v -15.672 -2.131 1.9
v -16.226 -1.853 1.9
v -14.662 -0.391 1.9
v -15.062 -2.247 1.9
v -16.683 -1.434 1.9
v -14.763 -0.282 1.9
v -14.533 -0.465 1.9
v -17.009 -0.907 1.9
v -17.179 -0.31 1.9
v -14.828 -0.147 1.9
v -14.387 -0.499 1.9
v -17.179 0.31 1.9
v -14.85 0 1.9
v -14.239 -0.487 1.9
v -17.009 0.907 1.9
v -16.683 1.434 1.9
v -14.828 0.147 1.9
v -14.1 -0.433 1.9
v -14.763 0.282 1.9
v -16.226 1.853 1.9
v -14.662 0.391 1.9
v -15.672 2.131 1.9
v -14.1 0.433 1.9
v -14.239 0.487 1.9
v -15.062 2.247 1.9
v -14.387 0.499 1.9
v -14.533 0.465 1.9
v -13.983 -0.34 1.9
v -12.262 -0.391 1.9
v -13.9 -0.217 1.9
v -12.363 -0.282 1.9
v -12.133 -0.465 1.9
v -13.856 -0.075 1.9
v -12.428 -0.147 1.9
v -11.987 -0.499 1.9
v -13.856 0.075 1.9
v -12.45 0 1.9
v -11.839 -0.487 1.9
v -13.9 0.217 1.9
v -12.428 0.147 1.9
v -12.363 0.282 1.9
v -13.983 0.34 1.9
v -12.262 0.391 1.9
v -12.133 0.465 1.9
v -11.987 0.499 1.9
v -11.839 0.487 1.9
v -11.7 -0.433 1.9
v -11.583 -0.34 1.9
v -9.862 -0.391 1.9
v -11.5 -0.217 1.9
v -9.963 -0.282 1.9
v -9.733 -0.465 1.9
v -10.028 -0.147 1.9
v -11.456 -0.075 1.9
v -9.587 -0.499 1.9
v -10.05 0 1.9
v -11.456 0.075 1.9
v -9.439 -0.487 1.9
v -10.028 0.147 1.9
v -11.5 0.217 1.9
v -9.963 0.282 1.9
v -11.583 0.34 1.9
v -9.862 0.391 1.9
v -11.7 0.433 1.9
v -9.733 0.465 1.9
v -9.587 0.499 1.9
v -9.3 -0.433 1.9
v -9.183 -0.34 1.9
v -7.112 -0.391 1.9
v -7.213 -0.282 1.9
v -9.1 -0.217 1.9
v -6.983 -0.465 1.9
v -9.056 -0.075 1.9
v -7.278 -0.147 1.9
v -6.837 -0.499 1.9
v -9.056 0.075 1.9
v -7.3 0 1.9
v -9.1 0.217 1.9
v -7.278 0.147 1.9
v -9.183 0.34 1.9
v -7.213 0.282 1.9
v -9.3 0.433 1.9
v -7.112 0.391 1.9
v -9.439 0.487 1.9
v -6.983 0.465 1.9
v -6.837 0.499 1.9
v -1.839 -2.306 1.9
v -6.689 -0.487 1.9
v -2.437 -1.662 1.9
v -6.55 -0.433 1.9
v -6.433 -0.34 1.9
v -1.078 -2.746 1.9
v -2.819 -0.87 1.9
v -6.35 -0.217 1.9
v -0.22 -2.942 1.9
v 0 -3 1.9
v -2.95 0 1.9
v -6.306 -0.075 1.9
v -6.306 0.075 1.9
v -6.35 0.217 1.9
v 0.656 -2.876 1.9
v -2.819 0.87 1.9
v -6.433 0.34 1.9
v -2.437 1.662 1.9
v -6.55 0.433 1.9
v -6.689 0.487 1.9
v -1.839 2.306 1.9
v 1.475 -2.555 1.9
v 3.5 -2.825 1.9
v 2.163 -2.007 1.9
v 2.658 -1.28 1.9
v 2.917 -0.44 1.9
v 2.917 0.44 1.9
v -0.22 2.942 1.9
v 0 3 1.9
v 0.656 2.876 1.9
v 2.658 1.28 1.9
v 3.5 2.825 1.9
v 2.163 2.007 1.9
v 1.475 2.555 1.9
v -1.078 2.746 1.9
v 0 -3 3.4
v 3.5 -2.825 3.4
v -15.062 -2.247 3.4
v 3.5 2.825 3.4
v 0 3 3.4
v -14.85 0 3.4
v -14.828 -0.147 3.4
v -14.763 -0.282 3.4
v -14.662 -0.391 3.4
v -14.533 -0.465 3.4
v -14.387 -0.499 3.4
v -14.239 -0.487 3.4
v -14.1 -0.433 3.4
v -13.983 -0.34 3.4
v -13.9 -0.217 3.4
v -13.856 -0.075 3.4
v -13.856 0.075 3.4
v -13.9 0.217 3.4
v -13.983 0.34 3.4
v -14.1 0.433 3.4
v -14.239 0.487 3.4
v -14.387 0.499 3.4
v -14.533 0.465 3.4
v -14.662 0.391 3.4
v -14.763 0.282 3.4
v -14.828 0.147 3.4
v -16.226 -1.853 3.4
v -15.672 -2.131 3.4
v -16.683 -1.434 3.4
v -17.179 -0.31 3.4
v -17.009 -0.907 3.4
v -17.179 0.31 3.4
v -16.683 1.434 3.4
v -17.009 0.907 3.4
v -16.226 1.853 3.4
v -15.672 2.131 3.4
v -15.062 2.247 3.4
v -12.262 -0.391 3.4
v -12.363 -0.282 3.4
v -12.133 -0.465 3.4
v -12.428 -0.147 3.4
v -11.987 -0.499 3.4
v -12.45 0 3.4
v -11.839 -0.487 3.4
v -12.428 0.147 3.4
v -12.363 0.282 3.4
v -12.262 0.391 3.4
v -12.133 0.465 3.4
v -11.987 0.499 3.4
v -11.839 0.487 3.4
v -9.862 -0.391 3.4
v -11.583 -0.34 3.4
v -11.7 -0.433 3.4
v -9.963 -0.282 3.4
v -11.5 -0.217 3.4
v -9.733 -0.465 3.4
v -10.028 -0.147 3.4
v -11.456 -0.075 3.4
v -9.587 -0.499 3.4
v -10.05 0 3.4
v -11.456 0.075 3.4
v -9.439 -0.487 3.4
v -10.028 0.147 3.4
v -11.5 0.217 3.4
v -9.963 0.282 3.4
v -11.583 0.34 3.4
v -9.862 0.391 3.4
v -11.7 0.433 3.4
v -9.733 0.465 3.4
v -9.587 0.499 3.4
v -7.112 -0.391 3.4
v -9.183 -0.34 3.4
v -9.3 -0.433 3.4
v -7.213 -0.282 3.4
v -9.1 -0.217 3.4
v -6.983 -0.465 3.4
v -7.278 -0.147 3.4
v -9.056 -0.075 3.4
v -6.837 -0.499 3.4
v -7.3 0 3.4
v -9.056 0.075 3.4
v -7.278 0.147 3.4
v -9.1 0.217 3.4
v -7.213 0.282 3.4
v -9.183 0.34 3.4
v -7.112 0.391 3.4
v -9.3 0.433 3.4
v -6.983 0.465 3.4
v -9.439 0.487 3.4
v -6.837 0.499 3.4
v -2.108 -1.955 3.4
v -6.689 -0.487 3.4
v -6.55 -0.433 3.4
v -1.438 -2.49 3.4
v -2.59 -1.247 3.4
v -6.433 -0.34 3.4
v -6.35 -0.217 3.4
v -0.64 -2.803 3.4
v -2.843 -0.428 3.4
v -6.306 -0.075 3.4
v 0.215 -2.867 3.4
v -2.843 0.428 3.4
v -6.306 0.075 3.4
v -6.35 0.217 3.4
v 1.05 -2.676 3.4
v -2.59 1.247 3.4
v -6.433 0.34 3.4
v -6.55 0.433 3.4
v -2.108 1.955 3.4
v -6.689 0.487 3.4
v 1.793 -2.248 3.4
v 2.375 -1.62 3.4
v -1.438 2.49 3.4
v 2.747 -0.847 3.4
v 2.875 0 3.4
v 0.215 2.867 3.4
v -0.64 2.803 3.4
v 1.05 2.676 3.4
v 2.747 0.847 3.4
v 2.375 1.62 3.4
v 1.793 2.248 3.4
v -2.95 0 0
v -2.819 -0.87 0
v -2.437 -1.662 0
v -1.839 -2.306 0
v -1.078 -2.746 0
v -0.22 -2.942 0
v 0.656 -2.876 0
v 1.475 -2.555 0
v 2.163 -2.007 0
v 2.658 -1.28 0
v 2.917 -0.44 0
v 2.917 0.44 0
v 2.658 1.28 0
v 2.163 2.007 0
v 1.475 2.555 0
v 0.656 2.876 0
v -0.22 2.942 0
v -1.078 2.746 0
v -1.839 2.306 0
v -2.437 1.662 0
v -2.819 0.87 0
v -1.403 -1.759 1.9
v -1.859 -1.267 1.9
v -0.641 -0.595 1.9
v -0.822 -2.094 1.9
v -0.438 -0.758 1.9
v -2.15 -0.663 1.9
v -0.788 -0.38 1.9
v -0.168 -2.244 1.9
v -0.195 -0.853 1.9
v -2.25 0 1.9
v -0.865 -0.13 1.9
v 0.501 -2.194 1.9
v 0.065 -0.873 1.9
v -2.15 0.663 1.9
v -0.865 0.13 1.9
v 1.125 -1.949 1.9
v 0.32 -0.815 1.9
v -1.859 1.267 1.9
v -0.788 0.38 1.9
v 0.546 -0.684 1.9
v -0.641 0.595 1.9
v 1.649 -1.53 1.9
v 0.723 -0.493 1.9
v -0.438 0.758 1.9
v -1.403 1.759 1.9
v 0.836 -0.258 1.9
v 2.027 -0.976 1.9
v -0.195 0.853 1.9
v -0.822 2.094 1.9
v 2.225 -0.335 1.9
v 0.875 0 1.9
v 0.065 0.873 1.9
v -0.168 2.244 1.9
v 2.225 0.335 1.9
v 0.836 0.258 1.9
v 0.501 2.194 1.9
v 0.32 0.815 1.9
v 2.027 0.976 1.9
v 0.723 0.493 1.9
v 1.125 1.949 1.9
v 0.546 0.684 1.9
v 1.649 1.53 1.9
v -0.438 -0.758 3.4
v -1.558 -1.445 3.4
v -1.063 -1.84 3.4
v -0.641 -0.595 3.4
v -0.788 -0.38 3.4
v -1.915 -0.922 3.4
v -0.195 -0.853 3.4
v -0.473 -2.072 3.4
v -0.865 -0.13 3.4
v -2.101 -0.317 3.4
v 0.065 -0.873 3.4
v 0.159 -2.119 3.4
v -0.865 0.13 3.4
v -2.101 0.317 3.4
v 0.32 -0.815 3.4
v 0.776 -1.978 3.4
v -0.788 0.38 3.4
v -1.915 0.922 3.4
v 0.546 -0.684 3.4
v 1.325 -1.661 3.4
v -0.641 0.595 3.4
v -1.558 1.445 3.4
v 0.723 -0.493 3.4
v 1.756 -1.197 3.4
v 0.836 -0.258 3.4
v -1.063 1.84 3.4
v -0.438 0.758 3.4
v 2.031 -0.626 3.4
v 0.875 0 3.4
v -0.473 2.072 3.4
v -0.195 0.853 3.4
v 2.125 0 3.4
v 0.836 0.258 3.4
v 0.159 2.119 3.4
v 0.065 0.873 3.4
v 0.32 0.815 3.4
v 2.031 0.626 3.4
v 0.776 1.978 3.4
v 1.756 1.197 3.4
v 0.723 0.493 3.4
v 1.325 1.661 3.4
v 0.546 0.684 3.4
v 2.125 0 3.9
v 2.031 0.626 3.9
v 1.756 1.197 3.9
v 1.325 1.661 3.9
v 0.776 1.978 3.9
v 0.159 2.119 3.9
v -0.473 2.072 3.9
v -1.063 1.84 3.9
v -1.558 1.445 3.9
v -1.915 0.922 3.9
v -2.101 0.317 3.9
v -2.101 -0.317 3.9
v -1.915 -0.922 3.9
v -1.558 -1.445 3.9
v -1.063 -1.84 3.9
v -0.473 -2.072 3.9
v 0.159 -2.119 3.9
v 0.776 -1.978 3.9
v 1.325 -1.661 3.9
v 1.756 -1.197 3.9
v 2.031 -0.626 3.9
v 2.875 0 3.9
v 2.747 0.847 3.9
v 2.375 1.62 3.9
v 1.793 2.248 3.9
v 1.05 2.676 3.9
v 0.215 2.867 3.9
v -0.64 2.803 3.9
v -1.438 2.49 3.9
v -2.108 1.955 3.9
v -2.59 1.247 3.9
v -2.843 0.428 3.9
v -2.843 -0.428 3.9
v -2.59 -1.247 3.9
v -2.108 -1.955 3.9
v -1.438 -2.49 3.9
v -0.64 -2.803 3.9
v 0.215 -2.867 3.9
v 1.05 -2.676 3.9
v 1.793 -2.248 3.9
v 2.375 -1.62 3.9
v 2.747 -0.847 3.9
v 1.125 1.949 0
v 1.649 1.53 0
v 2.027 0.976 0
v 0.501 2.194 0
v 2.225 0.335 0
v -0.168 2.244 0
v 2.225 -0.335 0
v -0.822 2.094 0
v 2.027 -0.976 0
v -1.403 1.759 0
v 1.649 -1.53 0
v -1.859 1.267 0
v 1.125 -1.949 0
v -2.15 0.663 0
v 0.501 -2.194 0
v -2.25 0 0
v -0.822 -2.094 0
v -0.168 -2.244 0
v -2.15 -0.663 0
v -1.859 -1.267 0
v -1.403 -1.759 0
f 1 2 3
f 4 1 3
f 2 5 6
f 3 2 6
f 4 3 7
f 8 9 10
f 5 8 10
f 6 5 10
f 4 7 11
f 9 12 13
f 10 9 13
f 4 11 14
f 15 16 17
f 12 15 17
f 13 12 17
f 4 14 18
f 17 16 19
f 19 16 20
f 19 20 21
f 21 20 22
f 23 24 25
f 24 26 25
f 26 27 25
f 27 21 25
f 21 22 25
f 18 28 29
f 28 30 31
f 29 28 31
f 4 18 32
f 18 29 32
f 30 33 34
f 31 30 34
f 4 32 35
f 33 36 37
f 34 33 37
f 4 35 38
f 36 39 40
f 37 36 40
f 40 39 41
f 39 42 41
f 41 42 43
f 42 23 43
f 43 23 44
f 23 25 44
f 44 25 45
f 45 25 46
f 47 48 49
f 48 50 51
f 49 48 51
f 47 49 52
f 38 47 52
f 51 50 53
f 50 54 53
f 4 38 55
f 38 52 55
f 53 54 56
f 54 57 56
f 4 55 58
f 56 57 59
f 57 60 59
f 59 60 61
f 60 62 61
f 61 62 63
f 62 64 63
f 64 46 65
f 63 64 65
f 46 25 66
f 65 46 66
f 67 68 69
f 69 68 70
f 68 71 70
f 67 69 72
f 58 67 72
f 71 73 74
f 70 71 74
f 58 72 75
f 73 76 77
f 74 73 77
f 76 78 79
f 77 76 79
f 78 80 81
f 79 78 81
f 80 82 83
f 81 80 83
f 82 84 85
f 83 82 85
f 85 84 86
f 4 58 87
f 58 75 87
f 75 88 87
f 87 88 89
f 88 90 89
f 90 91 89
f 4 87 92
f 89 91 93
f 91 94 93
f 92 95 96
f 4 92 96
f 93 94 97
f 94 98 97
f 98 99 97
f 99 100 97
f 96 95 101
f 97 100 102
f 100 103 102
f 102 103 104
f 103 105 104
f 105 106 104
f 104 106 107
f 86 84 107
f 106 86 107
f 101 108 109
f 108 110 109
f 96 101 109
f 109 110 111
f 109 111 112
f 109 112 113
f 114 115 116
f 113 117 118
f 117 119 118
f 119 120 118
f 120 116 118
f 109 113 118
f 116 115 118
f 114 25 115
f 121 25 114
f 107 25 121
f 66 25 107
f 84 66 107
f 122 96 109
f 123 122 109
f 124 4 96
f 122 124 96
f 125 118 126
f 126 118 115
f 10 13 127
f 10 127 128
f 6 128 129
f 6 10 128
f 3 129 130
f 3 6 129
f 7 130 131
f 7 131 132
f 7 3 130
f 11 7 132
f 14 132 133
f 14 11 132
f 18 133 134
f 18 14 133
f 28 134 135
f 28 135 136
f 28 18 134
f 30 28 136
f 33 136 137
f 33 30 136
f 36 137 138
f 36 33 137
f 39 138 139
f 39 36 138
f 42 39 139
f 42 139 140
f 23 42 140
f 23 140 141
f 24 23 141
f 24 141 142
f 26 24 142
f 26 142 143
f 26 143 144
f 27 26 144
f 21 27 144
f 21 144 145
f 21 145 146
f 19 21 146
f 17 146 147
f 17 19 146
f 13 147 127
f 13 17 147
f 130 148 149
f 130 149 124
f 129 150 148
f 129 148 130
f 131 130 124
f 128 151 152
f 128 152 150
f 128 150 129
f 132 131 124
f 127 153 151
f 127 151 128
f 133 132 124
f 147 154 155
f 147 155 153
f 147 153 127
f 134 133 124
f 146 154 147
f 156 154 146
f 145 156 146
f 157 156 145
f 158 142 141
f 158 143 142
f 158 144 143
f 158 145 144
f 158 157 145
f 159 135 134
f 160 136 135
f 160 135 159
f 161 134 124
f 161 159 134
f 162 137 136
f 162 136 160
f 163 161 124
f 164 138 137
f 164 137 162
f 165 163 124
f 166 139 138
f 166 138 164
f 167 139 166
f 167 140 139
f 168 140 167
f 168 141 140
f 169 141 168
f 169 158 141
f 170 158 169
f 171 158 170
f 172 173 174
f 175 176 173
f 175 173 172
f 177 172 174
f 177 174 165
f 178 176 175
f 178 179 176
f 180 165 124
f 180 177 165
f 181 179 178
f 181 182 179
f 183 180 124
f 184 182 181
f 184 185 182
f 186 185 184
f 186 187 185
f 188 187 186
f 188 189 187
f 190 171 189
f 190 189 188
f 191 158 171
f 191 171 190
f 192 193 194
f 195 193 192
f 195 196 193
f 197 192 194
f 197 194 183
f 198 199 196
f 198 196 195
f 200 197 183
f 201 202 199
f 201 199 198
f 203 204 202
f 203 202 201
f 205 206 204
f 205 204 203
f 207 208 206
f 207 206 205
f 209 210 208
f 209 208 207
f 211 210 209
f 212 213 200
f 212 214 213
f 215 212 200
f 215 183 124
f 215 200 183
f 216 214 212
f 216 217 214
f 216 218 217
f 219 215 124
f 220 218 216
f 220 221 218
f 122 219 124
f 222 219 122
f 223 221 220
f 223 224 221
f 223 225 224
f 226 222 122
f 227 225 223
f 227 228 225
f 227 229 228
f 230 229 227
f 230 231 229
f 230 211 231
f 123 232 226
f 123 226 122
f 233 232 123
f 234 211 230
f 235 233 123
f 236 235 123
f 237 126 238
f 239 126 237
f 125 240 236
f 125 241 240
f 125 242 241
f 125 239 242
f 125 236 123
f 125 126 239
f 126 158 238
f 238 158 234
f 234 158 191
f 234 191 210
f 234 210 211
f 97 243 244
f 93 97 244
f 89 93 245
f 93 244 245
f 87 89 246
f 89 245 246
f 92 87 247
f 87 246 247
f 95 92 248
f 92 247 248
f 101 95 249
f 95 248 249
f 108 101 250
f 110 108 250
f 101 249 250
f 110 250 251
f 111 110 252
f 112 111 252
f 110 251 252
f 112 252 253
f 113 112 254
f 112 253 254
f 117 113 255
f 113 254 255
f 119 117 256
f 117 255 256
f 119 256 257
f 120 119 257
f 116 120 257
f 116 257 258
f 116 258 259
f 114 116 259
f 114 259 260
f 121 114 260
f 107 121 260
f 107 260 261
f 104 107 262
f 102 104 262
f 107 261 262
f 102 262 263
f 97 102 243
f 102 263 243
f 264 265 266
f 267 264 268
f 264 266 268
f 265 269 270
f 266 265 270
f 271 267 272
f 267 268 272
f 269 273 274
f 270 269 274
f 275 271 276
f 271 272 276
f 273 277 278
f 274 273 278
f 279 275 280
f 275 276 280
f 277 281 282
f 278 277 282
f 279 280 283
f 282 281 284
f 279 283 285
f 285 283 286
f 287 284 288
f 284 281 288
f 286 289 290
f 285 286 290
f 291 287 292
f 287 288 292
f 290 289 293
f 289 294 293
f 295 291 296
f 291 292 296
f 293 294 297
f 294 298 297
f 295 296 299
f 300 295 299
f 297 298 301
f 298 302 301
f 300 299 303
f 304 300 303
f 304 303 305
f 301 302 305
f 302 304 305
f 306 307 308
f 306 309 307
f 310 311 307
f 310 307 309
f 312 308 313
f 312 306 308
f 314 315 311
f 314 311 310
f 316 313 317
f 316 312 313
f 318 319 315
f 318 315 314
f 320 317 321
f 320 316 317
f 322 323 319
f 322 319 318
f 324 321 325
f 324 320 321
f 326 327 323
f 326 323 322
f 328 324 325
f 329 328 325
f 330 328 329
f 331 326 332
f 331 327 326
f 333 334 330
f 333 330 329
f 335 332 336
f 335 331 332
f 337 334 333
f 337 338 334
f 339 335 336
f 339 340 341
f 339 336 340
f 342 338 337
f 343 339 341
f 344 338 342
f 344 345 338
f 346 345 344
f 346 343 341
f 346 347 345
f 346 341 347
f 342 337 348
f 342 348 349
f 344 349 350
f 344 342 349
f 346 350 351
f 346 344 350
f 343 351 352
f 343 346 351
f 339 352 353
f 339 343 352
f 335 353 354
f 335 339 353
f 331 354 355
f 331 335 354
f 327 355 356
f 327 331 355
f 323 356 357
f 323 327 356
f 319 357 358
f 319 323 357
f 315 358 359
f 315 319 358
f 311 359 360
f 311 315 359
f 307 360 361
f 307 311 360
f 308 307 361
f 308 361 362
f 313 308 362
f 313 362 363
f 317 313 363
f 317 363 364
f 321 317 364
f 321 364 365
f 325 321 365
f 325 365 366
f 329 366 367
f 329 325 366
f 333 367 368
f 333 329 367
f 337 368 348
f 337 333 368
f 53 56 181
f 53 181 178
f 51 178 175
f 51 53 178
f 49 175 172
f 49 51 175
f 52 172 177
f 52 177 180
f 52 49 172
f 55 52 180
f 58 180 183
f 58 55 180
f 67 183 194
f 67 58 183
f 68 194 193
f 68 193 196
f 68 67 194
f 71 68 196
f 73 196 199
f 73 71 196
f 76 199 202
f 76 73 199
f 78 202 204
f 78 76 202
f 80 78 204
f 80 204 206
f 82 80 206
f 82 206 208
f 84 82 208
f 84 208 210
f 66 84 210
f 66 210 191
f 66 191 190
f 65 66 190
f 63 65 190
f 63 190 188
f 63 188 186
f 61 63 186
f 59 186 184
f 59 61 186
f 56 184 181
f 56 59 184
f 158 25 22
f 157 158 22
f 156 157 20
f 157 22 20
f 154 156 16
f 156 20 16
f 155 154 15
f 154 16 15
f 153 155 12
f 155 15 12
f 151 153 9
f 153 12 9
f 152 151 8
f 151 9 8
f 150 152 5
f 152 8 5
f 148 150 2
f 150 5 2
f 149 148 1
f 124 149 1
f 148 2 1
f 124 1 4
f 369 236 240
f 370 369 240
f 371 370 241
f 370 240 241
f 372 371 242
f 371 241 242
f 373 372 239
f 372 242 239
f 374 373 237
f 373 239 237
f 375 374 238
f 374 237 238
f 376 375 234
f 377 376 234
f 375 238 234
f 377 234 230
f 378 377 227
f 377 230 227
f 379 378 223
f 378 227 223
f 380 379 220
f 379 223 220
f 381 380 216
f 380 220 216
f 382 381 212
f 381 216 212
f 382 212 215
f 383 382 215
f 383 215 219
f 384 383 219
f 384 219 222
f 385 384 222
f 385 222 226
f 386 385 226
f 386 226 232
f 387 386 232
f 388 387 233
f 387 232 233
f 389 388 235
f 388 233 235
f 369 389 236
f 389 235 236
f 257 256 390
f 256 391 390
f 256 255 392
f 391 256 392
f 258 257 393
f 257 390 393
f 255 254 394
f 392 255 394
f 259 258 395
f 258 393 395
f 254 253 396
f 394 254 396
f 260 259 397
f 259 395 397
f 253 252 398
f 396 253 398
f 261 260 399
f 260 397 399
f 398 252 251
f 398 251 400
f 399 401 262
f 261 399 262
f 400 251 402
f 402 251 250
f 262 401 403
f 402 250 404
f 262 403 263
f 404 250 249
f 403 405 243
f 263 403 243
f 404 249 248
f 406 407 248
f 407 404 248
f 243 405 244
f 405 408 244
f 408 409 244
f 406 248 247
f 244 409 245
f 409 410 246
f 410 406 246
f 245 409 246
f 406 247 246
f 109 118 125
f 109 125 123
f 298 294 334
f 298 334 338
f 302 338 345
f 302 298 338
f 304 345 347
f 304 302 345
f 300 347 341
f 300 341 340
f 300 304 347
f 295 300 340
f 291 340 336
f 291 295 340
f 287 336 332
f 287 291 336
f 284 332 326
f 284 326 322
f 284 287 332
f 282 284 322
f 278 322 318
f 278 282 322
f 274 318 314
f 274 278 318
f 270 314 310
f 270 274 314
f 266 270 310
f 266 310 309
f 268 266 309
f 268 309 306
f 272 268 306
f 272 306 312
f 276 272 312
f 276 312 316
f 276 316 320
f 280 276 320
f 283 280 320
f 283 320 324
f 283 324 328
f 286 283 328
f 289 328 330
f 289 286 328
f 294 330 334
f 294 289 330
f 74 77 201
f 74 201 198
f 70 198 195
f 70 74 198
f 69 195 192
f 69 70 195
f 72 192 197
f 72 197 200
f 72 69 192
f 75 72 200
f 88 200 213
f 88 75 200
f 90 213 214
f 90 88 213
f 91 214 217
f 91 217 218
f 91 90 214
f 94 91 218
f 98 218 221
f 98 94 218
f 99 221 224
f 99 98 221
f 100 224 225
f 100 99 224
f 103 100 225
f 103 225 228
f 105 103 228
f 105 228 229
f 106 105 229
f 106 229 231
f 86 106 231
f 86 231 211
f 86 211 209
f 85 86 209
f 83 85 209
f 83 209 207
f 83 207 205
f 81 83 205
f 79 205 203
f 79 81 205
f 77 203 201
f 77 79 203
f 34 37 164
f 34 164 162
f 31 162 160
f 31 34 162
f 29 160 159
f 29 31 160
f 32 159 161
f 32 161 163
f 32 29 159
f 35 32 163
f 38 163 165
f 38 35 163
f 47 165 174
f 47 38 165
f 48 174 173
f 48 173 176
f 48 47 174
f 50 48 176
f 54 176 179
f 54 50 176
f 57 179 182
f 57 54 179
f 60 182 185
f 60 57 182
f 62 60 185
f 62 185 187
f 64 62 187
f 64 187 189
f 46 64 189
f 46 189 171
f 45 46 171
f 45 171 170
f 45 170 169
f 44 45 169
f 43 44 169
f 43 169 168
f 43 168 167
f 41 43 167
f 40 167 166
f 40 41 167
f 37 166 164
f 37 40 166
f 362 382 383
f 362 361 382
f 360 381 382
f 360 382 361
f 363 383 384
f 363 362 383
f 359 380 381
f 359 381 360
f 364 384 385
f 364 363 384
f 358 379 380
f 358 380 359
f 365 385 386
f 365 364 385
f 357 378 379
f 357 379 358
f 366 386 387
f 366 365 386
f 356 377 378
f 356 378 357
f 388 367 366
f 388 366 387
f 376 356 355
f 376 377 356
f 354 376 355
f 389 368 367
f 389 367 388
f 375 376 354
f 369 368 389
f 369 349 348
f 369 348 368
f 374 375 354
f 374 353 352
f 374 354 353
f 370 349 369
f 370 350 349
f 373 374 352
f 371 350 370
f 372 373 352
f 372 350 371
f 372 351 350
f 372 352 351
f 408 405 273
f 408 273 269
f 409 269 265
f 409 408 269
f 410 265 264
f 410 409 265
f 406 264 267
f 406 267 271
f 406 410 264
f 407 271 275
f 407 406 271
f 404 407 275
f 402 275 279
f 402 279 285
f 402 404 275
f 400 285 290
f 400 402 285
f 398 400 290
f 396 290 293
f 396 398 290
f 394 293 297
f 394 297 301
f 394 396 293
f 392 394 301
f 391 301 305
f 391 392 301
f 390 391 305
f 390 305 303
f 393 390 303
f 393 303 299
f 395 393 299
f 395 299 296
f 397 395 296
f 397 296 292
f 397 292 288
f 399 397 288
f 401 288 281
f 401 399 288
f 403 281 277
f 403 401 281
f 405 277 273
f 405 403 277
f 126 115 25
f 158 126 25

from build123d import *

# Parameters (mm, degrees)
SKETCH1_R           = 2.95
SKETCH1_R_2         = 2.25
BOSS_EXTRUDE1_DEPTH = 1.9
SKETCH2_R           = 0.875
SKETCH2_R_2         = 0.5
BOSS_EXTRUDE2_DEPTH = 1.5
SKETCH3_R           = 2.875
SKETCH3_R_2         = 2.125
BOSS_EXTRUDE3_DEPTH = 0.5
CUT_EXTRUDE1_START  = -10
CUT_EXTRUDE1_DEPTH  = 10


with BuildPart() as part:
    # Sketch1 → Boss-Extrude1 (new body)
    with BuildSketch(Plane.XY):
        with Locations(Location((0, 0, 0), (0, 0, 180))):
            Circle(SKETCH1_R)
        with Locations(Location((0, 0, 0), (0, 0, 180))):
            Circle(SKETCH1_R_2, mode=Mode.SUBTRACT)
    extrude(amount=BOSS_EXTRUDE1_DEPTH)

    # Sketch2 → Boss-Extrude2 (add)
    with BuildSketch(Plane.XY.offset(1.9)):
        with BuildLine():
            Line((15.062313393, 2.247195074), (0, 3))
            Line((0, 3), (-15.062313393, 2.247195074))
            ThreePointArc((-15.062313393, 2.247195074), (-17.2, 0), (-15.062313393, -2.247195074))
            Line((-15.062313393, -2.247195074), (0, -3))
            Line((0, -3), (15.062313393, -2.247195074))
            ThreePointArc((15.062313393, -2.247195074), (17.2, 0), (15.062313393, 2.247195074))
        make_face()
        Circle(SKETCH2_R, mode=Mode.SUBTRACT)
        with Locations((6.8, 0)):
            Circle(SKETCH2_R_2, mode=Mode.SUBTRACT)
        with Locations((9.55, 0)):
            Circle(SKETCH2_R_2, mode=Mode.SUBTRACT)
        with Locations((11.95, 0)):
            Circle(SKETCH2_R_2, mode=Mode.SUBTRACT)
        with Locations((14.35, 0)):
            Circle(SKETCH2_R_2, mode=Mode.SUBTRACT)
        with Locations(Location((-14.35, 0, 0), (0, 0, 180))):
            Circle(SKETCH2_R_2, mode=Mode.SUBTRACT)
        with Locations(Location((-11.95, 0, 0), (0, 0, 180))):
            Circle(SKETCH2_R_2, mode=Mode.SUBTRACT)
        with Locations(Location((-9.55, 0, 0), (0, 0, 180))):
            Circle(SKETCH2_R_2, mode=Mode.SUBTRACT)
        with Locations(Location((-6.8, 0, 0), (0, 0, 180))):
            Circle(SKETCH2_R_2, mode=Mode.SUBTRACT)
    extrude(amount=BOSS_EXTRUDE2_DEPTH)

    # Sketch3 → Boss-Extrude3 (add)
    with BuildSketch(Plane.XY.offset(3.4)):
        Circle(SKETCH3_R)
        Circle(SKETCH3_R_2, mode=Mode.SUBTRACT)
    extrude(amount=BOSS_EXTRUDE3_DEPTH)

    # Sketch4 → Cut-Extrude1 (cut)
    with BuildSketch(Plane.XY.offset(3.4).offset(CUT_EXTRUDE1_START)):
        with BuildLine():
            Line((3.5, 2.825072207), (3.5, -2.825072207))
            Line((3.5, -2.825072207), (15.062313393, -2.247195074))
            ThreePointArc((15.062313393, -2.247195074), (17.2, 0), (15.062313393, 2.247195074))
            Line((15.062313393, 2.247195074), (3.5, 2.825072207))
        make_face()
    extrude(amount=CUT_EXTRUDE1_DEPTH, mode=Mode.SUBTRACT)


solid = part.part
